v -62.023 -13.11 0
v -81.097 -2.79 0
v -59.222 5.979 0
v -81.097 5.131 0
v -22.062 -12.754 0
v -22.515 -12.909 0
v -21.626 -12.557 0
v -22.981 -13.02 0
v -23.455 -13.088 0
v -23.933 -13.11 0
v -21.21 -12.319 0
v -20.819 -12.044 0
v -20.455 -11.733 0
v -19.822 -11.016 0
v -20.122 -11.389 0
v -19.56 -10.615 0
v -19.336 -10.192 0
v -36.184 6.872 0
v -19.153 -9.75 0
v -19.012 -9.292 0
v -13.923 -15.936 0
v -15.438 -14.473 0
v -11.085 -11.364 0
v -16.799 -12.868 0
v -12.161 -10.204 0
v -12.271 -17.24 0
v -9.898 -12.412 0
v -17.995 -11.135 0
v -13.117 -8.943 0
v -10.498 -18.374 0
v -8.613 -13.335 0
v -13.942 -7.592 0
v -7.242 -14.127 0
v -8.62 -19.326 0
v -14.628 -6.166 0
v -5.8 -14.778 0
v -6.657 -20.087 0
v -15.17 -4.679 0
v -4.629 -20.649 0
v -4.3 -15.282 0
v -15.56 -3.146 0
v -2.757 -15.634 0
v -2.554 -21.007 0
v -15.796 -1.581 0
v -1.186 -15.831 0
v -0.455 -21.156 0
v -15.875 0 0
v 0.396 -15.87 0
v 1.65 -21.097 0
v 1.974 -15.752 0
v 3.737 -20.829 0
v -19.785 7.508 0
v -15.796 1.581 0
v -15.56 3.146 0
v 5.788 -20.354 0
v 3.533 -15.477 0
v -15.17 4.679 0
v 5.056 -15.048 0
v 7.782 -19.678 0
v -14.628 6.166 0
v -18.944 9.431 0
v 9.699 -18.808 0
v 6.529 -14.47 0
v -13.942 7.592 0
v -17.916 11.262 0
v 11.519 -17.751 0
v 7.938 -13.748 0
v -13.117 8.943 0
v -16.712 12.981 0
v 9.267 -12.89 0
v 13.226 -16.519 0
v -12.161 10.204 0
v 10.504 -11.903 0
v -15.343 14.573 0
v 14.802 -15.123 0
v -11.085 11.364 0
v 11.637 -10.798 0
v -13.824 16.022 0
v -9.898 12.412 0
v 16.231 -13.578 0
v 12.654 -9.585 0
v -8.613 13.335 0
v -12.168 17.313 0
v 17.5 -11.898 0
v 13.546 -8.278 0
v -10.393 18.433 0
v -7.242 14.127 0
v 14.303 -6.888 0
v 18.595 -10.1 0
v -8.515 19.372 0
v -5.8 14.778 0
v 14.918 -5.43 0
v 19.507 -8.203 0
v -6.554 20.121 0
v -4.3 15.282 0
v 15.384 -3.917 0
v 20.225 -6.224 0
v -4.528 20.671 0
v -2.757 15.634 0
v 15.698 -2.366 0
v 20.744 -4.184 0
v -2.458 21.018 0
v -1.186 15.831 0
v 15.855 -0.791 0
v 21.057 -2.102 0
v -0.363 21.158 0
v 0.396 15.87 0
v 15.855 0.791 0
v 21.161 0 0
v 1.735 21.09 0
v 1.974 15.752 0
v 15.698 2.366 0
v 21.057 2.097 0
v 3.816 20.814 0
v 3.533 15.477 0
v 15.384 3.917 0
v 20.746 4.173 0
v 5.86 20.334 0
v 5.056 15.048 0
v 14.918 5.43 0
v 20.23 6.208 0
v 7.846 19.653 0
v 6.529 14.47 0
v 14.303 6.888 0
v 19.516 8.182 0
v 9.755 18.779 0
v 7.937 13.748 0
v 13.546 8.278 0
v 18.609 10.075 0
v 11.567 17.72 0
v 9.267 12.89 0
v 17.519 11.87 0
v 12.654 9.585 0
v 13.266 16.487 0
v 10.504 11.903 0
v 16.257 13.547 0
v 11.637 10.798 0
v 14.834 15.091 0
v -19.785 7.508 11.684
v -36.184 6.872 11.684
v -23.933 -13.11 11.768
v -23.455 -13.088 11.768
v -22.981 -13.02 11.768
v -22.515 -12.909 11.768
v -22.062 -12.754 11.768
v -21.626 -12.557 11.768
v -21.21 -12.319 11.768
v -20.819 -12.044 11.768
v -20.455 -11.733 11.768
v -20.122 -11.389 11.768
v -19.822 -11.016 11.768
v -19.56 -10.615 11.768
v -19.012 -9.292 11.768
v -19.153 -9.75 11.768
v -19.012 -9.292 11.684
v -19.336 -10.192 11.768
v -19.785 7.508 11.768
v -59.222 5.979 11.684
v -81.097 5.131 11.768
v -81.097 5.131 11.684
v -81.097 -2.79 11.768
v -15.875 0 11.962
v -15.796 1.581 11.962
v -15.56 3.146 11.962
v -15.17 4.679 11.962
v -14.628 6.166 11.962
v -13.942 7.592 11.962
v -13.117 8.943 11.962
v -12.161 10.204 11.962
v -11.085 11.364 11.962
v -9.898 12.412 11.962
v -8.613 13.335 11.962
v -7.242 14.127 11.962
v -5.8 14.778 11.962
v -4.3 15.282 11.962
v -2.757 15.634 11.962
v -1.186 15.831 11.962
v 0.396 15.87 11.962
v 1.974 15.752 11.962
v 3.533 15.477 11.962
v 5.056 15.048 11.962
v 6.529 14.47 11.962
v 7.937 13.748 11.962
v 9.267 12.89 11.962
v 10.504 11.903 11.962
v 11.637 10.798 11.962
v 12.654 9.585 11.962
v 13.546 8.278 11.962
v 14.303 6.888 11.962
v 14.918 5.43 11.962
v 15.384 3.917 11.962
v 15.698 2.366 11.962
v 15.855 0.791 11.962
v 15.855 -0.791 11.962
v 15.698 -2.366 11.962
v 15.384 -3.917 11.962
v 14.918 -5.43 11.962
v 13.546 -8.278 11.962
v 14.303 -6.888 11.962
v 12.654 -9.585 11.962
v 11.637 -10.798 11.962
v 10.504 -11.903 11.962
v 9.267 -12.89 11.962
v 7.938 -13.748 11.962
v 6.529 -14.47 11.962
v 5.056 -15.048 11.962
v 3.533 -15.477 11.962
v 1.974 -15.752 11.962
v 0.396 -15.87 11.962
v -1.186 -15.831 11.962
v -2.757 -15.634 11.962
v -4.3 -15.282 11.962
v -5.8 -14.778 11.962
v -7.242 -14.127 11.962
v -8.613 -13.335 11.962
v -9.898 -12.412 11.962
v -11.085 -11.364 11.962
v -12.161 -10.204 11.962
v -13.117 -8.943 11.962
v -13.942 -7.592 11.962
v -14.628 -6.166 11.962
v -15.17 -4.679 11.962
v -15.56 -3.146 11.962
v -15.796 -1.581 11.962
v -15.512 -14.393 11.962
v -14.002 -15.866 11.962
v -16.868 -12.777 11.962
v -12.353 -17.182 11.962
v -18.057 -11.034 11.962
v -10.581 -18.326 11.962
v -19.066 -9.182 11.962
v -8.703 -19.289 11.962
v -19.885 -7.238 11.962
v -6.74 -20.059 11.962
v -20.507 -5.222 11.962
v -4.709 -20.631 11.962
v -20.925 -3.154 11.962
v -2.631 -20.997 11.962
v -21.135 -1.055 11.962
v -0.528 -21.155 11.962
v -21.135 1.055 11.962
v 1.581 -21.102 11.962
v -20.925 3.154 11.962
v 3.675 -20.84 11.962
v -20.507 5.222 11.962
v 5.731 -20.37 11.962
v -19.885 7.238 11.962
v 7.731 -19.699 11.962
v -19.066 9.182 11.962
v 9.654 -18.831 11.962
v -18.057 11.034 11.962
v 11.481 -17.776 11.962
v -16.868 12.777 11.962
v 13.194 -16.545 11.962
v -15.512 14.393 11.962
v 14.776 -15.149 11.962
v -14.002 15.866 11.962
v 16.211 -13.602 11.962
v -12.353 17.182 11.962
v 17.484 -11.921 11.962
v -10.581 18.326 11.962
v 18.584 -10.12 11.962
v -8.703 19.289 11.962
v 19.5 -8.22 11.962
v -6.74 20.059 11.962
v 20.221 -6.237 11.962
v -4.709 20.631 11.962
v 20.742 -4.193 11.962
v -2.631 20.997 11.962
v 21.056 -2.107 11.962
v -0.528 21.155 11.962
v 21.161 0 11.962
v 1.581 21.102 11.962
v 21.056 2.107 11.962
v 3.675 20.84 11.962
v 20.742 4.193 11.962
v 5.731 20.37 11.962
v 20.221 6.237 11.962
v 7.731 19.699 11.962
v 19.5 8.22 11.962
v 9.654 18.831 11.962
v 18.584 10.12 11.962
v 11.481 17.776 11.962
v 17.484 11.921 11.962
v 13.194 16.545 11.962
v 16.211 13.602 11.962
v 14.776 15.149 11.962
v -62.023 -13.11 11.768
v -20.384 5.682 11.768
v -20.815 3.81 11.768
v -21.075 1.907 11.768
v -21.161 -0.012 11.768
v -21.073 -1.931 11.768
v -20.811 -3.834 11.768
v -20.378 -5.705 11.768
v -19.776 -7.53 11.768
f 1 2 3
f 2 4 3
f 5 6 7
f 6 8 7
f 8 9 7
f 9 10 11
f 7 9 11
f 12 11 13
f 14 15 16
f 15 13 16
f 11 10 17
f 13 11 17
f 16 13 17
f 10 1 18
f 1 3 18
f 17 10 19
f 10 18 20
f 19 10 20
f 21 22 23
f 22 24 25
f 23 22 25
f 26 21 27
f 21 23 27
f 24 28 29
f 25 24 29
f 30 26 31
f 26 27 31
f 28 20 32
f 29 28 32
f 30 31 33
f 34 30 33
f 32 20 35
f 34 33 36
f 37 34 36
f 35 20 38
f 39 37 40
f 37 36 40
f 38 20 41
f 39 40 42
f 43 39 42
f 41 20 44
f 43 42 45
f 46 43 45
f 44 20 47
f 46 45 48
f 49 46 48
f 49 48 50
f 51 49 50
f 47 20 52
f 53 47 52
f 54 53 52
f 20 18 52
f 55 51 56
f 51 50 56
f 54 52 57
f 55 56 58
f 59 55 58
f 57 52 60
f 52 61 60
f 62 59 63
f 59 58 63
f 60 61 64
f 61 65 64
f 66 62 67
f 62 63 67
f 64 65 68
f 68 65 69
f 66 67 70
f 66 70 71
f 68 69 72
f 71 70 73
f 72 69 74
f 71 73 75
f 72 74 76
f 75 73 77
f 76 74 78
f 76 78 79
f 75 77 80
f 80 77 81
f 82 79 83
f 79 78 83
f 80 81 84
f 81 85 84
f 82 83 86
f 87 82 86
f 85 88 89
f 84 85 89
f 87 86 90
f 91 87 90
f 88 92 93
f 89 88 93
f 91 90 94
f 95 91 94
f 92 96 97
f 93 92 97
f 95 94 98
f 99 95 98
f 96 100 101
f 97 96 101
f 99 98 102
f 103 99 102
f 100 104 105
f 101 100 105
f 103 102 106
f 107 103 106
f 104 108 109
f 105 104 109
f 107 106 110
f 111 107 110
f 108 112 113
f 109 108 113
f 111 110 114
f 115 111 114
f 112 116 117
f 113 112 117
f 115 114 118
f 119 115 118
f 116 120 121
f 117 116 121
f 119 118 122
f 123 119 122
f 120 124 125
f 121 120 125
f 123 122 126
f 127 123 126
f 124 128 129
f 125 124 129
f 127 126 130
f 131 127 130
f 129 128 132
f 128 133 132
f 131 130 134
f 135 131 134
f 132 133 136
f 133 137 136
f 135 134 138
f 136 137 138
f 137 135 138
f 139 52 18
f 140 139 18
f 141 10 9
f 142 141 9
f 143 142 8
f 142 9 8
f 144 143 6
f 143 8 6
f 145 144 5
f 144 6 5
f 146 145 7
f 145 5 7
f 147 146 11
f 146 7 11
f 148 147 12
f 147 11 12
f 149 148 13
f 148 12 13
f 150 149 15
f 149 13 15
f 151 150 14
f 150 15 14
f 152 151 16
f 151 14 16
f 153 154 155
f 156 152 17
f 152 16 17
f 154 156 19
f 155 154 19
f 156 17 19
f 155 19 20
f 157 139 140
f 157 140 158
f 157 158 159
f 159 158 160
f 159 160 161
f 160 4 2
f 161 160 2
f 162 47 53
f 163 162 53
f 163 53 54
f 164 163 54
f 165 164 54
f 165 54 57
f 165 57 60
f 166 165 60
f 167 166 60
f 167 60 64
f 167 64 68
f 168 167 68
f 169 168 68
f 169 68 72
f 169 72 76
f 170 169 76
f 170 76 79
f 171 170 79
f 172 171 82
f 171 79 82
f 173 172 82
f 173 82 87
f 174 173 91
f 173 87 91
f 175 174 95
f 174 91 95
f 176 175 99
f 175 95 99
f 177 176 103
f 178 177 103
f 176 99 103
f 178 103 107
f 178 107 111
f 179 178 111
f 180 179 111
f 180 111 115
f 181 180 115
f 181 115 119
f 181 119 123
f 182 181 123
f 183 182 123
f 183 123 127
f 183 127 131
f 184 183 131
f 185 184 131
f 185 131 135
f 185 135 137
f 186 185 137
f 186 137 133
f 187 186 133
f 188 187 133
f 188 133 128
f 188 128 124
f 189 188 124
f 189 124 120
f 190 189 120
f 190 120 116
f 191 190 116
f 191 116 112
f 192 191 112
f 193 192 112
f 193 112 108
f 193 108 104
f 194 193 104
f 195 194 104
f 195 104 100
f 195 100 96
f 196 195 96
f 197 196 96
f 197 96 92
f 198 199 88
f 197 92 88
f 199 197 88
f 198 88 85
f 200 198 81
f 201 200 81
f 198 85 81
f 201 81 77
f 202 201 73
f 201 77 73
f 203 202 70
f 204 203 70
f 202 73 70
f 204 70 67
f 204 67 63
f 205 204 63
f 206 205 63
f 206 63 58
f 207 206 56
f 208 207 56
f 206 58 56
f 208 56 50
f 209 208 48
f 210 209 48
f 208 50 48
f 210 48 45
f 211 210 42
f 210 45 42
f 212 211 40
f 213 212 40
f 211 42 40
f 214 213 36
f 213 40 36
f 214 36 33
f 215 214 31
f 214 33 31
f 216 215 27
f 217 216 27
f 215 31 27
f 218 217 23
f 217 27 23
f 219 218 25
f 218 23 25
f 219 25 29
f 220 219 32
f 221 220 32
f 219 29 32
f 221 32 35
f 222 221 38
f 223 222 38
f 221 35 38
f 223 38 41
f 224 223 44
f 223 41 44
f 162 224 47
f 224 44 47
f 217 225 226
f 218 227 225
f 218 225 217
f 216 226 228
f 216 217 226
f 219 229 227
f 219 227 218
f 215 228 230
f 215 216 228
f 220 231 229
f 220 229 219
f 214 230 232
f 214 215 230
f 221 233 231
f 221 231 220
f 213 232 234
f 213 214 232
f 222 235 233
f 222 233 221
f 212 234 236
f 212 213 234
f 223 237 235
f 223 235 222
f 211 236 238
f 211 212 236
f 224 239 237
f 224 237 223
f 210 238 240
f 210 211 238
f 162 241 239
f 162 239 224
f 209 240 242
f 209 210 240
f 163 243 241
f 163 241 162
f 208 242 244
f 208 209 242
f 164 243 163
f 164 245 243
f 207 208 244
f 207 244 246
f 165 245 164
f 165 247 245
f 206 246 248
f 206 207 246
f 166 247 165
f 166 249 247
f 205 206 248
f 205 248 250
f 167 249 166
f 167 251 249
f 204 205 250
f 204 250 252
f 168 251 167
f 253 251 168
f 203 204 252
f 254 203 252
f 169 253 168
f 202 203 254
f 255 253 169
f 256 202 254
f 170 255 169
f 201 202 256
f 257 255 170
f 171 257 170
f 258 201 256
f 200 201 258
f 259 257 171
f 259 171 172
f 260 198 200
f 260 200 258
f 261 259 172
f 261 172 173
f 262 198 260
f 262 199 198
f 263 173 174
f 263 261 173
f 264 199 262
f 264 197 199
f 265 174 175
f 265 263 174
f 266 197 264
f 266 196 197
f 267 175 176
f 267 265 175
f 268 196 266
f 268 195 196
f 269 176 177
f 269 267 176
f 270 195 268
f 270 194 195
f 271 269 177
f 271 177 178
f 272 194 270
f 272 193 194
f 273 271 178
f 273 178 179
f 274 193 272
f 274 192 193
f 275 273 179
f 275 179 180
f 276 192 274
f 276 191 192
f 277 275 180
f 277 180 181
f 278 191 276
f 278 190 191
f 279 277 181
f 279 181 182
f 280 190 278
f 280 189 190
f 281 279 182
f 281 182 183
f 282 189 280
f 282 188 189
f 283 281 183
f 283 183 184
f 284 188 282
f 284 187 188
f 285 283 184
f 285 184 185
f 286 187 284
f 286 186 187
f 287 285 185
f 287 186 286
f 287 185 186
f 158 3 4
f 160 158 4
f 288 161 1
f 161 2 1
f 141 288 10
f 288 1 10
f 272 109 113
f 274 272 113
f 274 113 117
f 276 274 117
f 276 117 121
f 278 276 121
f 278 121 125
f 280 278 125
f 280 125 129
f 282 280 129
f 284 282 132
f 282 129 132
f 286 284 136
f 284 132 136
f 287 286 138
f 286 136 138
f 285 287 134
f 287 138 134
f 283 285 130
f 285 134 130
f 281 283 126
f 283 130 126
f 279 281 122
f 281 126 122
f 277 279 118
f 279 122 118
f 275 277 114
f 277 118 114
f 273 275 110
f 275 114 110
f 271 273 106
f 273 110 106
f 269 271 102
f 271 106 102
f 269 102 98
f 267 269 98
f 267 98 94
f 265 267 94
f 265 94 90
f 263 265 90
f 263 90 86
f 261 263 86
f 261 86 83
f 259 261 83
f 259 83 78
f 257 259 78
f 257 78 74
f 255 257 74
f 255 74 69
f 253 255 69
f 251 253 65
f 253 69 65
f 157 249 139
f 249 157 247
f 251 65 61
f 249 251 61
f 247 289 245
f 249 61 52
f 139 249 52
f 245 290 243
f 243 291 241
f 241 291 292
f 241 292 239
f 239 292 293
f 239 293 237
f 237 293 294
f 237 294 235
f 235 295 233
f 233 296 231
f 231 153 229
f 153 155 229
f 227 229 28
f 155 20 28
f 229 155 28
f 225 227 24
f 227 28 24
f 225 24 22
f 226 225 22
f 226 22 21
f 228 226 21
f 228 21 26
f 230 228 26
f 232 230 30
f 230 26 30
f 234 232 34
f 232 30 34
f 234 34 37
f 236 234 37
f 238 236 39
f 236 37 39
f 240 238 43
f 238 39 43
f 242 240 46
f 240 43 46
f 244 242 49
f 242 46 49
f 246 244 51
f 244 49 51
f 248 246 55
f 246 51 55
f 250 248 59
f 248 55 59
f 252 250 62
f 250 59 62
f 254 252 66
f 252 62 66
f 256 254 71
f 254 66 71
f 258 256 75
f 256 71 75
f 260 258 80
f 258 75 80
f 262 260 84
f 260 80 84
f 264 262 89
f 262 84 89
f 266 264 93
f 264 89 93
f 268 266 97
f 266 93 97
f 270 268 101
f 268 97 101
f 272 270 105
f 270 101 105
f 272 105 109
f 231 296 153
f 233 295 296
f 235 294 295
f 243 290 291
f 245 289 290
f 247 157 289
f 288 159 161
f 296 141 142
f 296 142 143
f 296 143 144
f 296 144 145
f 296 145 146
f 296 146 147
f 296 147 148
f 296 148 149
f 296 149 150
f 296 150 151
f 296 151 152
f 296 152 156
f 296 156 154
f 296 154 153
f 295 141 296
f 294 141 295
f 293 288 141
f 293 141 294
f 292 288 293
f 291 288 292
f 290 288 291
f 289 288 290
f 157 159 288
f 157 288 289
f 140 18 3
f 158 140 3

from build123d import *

# Parameters (mm, degrees)
F0_R        = 21.1613086429
F1_DEPTH    = 11.9615718722
F3_DEPTH    = 11.6841569543
F4_T1_DEPTH = 36.288056526
F6_DEPTH    = 0.0834609382
F10_D       = 31.75


# Not quite as in the source:
# - a fillet or chamfer that OpenCascade refuses, or shapes differently, is made with other operations: its cross-section is extruded or revolved along the edge and cut away or added
# - the program builds the solid bodies; features that only make, move or delete a surface that nothing else refers to are left out


with BuildPart() as f1:
    # F0 (on Top) → F1 (new body)
    with BuildSketch(Plane.XY):
        Circle(F0_R)
    extrude(amount=F1_DEPTH)

    # F2 (on Top) → F3 (join)
    with BuildSketch(Plane.XY):
        Polygon((-19.0119333565, -13.1104551256), (-19.0119333565, 7.5374748558), (-36.1838054091, 6.8717853914), (-59.2216673993, 5.9786933651), (-81.0971707106, 5.1306616515), (-81.0971707106, -2.7903839946), (-62.0231479406, -13.1104551256), align=None)
    extrude(amount=F3_DEPTH)

    # F4: fillet of radius 5.08 on 1 edges, made by hand

    # F4_s2 → F4_t1 (cut)
    with BuildSketch(Plane.XY.offset(-12.3019497859)):
        with BuildLine():
            ThreePointArc((-19.0119333565, -9.2923287462), (-20.8185454842, -12.0439771445), (-23.9327132709, -13.1104551256))
            Line((-23.9327132709, -13.1104551256), (-19.0119333565, -13.1104551256))
            Line((-19.0119333565, -13.1104551256), (-19.0119333565, -9.2923287462))
        make_face()
    extrude(amount=F4_T1_DEPTH, mode=Mode.SUBTRACT)

    # F5 (on face) → F6 (join)
    with BuildSketch(Plane.XY.offset(11.6841569543)):
        with BuildLine():
            ThreePointArc((-19.0119333565, -9.2923287462), (-21.1389513114, -0.9724818434), (-19.7847977051, 7.5075137862))
            Line((-19.7847977051, 7.5075137862), (-81.0971707106, 5.1306616515))
            Line((-81.0971707106, 5.1306616515), (-81.0971707106, -2.7903839946))
            Line((-81.0971707106, -2.7903839946), (-62.0231479406, -13.1104551256))
            Line((-62.0231479406, -13.1104551256), (-23.9327132709, -13.1104551256))
            ThreePointArc((-23.9327132709, -13.1104551256), (-20.8185454842, -12.0439771445), (-19.0119333565, -9.2923287462))
        make_face()
    extrude(amount=F6_DEPTH)

    # F10 (through all)
    with Locations(Plane.XY.offset(11.9615718722)):
        with Locations((0, 0)):
            Hole(F10_D / 2)


solid = f1.part
